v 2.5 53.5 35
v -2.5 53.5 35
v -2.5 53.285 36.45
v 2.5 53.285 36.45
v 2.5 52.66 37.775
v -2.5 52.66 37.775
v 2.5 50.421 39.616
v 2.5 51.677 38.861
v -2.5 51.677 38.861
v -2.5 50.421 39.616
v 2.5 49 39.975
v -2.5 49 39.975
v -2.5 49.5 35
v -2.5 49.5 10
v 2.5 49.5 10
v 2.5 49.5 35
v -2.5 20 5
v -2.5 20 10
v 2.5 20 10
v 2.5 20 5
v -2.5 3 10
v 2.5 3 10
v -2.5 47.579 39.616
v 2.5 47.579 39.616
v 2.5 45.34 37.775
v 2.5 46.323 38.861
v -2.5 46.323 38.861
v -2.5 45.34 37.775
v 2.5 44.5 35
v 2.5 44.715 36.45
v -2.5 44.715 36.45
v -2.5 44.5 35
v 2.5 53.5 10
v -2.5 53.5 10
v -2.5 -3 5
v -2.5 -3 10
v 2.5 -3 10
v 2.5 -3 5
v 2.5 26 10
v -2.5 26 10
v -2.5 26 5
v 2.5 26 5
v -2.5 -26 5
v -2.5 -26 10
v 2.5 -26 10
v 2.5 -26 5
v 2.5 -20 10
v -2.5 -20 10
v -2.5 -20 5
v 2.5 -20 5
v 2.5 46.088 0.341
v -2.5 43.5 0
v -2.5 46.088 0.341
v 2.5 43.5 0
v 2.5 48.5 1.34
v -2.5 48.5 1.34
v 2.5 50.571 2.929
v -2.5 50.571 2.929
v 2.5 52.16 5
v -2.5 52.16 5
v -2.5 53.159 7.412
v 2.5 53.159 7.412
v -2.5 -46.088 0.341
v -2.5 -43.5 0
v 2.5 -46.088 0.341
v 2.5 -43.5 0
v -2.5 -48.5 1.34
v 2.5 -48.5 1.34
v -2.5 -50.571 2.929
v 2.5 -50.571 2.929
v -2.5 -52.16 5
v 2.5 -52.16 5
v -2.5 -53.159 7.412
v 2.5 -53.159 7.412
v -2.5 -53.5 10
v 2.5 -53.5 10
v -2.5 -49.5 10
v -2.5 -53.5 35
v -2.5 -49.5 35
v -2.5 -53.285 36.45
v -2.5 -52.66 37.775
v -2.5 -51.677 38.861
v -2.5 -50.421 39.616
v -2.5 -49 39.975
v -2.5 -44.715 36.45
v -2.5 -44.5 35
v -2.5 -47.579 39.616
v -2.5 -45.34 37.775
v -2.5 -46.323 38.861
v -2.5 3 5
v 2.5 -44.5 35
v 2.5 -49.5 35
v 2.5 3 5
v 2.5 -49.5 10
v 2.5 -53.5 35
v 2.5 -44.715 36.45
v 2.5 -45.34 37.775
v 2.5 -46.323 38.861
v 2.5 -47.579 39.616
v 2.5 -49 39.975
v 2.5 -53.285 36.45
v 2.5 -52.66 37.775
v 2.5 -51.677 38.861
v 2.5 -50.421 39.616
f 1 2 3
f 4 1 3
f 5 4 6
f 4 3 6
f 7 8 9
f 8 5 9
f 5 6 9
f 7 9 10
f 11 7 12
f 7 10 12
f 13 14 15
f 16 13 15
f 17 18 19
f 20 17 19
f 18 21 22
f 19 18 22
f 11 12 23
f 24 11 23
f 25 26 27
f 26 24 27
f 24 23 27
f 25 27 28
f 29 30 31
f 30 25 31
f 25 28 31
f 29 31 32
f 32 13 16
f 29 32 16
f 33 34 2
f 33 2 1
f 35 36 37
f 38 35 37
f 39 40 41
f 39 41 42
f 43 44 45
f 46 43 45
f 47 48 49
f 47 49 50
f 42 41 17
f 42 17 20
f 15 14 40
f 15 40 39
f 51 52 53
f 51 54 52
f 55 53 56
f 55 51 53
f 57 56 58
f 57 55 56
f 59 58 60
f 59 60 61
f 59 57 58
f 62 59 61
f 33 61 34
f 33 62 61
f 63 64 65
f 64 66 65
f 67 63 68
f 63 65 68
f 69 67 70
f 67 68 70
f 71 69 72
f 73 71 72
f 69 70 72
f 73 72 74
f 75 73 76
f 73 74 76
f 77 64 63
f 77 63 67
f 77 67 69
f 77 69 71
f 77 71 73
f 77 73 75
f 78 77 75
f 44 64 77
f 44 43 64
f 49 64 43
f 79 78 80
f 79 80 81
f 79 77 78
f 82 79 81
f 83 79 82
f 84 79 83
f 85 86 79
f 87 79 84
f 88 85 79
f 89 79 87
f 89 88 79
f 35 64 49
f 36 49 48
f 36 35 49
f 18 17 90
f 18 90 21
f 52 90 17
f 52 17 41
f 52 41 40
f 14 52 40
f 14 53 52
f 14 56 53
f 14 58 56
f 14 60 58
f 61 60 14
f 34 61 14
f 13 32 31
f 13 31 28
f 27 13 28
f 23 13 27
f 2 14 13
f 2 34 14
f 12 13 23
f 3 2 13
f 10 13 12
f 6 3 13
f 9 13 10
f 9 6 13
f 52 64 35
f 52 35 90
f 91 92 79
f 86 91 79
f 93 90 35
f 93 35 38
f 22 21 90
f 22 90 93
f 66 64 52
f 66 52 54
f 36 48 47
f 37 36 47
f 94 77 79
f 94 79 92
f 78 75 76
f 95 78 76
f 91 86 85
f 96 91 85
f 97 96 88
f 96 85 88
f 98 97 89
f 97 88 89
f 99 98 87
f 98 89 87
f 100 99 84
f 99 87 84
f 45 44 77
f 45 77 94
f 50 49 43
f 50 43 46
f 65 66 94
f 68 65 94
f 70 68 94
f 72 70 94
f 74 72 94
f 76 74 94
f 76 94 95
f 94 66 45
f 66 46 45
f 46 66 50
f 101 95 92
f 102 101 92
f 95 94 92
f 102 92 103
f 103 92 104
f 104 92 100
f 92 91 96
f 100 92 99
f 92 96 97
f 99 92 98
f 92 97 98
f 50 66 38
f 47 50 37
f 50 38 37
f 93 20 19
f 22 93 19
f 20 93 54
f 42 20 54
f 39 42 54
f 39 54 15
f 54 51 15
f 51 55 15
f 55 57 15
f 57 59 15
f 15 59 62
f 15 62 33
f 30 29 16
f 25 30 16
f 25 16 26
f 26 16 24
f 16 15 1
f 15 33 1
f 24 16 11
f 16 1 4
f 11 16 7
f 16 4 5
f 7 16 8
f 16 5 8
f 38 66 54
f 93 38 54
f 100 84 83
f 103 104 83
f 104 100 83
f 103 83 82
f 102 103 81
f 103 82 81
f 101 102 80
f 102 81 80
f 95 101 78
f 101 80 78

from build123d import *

# Parameters (mm, degrees)
F0_W         = 5
F0_H         = 107
F1_DEPTH     = 10
F3_W         = 5
F3_H         = 6
F4_DEPTH     = 5
F5_DEPTH     = 5
F6_R         = 9.99999
F2_W         = 5
F2_H         = 4
F7_DEPTH     = 30
F8_DEPTH     = 30
F9_W         = 5
F9_H         = 5
F10_DEPTH    = 5
F11_W        = 5
F11_H        = 5
F12_DEPTH    = 5
F13_T1_DEPTH = 30
F14_W        = 5
F14_H        = 6
F15_DEPTH    = 5


# Not quite as in the source:
# - a fillet or chamfer that OpenCascade refuses, or shapes differently, is made with other operations: its cross-section is extruded or revolved along the edge and cut away or added
# - a fillet or chamfer is up to 0.001 mm smaller than in the source, because OpenCascade refuses the exact size
# - a feature names something its author has since deleted; it is built from what else it names


with BuildPart() as f1:
    # F0 (on Top) → F1 (new body)
    with BuildSketch(Plane.XY):
        Rectangle(F0_W, F0_H)
    extrude(amount=F1_DEPTH)

    # F3 (on face) → F4 (cut)
    with BuildSketch(Plane.XY.offset(10)):
        with Locations((0, 23)):
            Rectangle(F3_W, F3_H)
    extrude(amount=-F4_DEPTH, mode=Mode.SUBTRACT)

    # F3 (on face) → F5 (cut)
    with BuildSketch(Plane.XY.offset(10)):
        with Locations((0, 23)):
            Rectangle(F3_W, F3_H)
        with Locations((0, -23)):
            Rectangle(F3_W, F3_H)
    extrude(amount=-F5_DEPTH, mode=Mode.SUBTRACT)

    # F6 (radius 10 in the source; OpenCascade refuses exactly that, so slightly less here)
    f6_edges = [f1.edges().sort_by_distance(p)[0] for p in [
        (0, -53.5, 0),
        (0, 53.5, 0),
    ]]
    fillet(f6_edges, radius=F6_R)

    # F2 (on face) → F7 (join)
    with BuildSketch(Plane.XY.offset(10)):
        with Locations((0, 51.5)):
            Rectangle(F2_W, F2_H)
    extrude(amount=F7_DEPTH)

    # F2 (on face) → F8 (join)
    with BuildSketch(Plane.XY.offset(10)):
        with Locations((0, 51.5)):
            Rectangle(F2_W, F2_H)
        with Locations((0, -51.5)):
            Rectangle(F2_W, F2_H)
    extrude(amount=F8_DEPTH)

    # F9 (on face) → F10 (join)
    with BuildSketch(Plane(origin=(0, -49.5, 0), x_dir=(-1, 0, 0), z_dir=(0, 1, 0))):
        with Locations((0, 37.5)):
            Rectangle(F9_W, F9_H)
    extrude(amount=F10_DEPTH)

    # F11 (on face) → F12 (join)
    with BuildSketch(Plane.XZ.offset(-49.5)):
        with Locations((0, 37.5)):
            Rectangle(F11_W, F11_H)
    extrude(amount=F12_DEPTH)

    # F13: fillet of radius 5 on 4 edges, made by hand

    # F13_s2 → F13_t1 (cut)
    with BuildSketch(Plane.YZ.offset(-15)):
        with BuildLine():
            ThreePointArc((-48.5, 40), (-52.0355339059, 38.5355339059), (-53.5, 35))
            Line((-53.5, 35), (-53.5, 40))
            Line((-53.5, 40), (-48.5, 40))
        make_face()
        with BuildLine():
            ThreePointArc((53.5, 35), (52.0355339059, 38.5355339059), (48.5, 40))
            Line((48.5, 40), (53.5, 40))
            Line((53.5, 40), (53.5, 35))
        make_face()
        with BuildLine():
            ThreePointArc((49.5, 40), (45.9644660941, 38.5355339059), (44.5, 35))
            Line((44.5, 35), (44.5, 40))
            Line((44.5, 40), (49.5, 40))
        make_face()
        with BuildLine():
            ThreePointArc((-44.5, 35), (-45.9644660941, 38.5355339059), (-49.5, 40))
            Line((-49.5, 40), (-44.5, 40))
            Line((-44.5, 40), (-44.5, 35))
        make_face()
    extrude(amount=F13_T1_DEPTH, mode=Mode.SUBTRACT)

    # F14 (on face) → F15 (cut)
    with BuildSketch(Plane.XY.offset(10)):
        Rectangle(F14_W, F14_H)
    extrude(amount=-F15_DEPTH, mode=Mode.SUBTRACT)


solid = f1.part
